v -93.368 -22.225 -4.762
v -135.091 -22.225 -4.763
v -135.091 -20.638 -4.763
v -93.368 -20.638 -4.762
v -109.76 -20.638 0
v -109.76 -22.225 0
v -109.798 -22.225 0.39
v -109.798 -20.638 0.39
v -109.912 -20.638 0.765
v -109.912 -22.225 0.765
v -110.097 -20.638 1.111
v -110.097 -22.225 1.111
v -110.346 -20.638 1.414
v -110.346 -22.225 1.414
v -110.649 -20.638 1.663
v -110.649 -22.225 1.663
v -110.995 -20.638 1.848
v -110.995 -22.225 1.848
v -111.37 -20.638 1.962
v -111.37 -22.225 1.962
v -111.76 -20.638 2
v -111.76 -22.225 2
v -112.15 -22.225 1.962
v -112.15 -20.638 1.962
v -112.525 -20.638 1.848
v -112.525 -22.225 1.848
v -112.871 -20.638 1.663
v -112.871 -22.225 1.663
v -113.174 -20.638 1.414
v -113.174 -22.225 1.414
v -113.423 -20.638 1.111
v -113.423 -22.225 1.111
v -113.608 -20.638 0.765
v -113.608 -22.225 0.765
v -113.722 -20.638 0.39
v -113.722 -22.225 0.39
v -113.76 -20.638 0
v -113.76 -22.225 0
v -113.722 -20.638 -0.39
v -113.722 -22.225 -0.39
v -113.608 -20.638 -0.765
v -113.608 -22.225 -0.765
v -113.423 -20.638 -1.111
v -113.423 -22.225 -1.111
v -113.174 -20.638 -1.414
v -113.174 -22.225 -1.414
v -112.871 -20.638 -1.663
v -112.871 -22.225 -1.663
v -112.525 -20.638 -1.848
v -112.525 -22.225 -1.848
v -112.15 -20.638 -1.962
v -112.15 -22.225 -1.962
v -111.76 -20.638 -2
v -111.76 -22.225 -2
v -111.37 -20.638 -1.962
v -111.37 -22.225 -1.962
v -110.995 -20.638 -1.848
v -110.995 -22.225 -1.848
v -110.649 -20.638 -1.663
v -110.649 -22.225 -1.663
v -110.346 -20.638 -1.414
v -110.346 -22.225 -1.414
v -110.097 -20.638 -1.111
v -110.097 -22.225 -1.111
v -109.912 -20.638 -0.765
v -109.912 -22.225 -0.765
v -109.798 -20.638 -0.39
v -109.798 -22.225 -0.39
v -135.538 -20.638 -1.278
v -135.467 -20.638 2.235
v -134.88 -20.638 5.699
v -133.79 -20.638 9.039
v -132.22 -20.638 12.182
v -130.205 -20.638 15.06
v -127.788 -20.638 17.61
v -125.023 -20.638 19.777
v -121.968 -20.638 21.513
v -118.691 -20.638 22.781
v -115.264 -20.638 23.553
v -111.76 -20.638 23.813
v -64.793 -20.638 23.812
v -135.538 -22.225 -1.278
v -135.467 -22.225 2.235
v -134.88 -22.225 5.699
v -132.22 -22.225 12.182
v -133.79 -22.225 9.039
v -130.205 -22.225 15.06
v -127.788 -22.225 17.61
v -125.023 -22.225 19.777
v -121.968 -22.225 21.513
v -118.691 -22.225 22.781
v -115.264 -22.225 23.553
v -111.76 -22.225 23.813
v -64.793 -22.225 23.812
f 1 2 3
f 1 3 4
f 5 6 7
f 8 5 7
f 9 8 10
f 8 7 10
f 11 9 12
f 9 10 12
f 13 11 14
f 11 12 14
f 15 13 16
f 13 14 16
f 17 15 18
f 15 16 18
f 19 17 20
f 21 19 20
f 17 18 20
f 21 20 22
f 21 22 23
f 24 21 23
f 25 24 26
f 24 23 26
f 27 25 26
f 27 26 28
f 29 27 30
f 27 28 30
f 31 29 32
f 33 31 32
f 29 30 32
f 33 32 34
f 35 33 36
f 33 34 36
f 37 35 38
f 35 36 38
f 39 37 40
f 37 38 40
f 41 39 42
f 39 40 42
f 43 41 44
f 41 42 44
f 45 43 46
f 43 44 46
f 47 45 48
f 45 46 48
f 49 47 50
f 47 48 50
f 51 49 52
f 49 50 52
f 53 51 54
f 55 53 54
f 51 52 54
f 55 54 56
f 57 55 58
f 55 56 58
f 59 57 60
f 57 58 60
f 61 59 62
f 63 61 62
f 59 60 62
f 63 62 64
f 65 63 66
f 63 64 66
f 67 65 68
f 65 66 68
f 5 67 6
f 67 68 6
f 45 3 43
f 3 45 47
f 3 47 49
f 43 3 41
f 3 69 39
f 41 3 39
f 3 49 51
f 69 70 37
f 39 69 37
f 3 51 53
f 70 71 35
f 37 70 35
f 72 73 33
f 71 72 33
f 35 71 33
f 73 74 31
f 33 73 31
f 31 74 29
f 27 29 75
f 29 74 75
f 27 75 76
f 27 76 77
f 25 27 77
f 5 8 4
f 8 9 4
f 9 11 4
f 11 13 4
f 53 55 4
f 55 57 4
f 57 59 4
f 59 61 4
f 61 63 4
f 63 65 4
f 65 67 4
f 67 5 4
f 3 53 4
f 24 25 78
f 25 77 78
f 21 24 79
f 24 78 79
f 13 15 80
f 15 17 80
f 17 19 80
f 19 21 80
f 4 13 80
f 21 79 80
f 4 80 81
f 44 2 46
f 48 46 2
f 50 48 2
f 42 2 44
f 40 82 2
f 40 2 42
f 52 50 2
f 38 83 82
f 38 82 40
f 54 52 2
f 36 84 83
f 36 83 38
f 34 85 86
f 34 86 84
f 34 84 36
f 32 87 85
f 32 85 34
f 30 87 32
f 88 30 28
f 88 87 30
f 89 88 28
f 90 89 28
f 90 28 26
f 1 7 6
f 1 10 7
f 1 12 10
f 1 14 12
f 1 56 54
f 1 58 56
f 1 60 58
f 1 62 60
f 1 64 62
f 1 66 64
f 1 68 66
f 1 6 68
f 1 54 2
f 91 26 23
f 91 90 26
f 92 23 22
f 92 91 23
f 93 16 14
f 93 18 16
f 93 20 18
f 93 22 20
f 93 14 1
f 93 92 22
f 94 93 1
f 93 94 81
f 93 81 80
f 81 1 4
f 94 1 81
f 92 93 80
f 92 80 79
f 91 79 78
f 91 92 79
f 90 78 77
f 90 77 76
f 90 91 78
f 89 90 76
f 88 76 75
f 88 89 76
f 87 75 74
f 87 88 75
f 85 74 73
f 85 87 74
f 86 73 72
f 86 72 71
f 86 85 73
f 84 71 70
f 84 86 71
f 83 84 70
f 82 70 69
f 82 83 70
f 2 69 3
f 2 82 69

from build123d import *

# Parameters (mm, degrees)
F2_R     = 2
F3_DEPTH = 1.5875


with BuildPart() as f3:
    # F2 (on offset) → F3 (new body)
    with BuildSketch(Plane.XZ.offset(22.225)):
        with BuildLine():
            Line((-64.792564, 23.8125), (-111.76, 23.8125))
            ThreePointArc((-111.76, 23.8125), (-130.205083, 15.060347), (-135.09139, -4.7625))
            Line((-135.09139, -4.7625), (-93.367564, -4.7625))
            Line((-93.367564, -4.7625), (-64.792564, 23.8125))
        make_face()
        with Locations((-111.76, 0)):
            Circle(F2_R, mode=Mode.SUBTRACT)
    extrude(amount=-F3_DEPTH)


solid = f3.part
